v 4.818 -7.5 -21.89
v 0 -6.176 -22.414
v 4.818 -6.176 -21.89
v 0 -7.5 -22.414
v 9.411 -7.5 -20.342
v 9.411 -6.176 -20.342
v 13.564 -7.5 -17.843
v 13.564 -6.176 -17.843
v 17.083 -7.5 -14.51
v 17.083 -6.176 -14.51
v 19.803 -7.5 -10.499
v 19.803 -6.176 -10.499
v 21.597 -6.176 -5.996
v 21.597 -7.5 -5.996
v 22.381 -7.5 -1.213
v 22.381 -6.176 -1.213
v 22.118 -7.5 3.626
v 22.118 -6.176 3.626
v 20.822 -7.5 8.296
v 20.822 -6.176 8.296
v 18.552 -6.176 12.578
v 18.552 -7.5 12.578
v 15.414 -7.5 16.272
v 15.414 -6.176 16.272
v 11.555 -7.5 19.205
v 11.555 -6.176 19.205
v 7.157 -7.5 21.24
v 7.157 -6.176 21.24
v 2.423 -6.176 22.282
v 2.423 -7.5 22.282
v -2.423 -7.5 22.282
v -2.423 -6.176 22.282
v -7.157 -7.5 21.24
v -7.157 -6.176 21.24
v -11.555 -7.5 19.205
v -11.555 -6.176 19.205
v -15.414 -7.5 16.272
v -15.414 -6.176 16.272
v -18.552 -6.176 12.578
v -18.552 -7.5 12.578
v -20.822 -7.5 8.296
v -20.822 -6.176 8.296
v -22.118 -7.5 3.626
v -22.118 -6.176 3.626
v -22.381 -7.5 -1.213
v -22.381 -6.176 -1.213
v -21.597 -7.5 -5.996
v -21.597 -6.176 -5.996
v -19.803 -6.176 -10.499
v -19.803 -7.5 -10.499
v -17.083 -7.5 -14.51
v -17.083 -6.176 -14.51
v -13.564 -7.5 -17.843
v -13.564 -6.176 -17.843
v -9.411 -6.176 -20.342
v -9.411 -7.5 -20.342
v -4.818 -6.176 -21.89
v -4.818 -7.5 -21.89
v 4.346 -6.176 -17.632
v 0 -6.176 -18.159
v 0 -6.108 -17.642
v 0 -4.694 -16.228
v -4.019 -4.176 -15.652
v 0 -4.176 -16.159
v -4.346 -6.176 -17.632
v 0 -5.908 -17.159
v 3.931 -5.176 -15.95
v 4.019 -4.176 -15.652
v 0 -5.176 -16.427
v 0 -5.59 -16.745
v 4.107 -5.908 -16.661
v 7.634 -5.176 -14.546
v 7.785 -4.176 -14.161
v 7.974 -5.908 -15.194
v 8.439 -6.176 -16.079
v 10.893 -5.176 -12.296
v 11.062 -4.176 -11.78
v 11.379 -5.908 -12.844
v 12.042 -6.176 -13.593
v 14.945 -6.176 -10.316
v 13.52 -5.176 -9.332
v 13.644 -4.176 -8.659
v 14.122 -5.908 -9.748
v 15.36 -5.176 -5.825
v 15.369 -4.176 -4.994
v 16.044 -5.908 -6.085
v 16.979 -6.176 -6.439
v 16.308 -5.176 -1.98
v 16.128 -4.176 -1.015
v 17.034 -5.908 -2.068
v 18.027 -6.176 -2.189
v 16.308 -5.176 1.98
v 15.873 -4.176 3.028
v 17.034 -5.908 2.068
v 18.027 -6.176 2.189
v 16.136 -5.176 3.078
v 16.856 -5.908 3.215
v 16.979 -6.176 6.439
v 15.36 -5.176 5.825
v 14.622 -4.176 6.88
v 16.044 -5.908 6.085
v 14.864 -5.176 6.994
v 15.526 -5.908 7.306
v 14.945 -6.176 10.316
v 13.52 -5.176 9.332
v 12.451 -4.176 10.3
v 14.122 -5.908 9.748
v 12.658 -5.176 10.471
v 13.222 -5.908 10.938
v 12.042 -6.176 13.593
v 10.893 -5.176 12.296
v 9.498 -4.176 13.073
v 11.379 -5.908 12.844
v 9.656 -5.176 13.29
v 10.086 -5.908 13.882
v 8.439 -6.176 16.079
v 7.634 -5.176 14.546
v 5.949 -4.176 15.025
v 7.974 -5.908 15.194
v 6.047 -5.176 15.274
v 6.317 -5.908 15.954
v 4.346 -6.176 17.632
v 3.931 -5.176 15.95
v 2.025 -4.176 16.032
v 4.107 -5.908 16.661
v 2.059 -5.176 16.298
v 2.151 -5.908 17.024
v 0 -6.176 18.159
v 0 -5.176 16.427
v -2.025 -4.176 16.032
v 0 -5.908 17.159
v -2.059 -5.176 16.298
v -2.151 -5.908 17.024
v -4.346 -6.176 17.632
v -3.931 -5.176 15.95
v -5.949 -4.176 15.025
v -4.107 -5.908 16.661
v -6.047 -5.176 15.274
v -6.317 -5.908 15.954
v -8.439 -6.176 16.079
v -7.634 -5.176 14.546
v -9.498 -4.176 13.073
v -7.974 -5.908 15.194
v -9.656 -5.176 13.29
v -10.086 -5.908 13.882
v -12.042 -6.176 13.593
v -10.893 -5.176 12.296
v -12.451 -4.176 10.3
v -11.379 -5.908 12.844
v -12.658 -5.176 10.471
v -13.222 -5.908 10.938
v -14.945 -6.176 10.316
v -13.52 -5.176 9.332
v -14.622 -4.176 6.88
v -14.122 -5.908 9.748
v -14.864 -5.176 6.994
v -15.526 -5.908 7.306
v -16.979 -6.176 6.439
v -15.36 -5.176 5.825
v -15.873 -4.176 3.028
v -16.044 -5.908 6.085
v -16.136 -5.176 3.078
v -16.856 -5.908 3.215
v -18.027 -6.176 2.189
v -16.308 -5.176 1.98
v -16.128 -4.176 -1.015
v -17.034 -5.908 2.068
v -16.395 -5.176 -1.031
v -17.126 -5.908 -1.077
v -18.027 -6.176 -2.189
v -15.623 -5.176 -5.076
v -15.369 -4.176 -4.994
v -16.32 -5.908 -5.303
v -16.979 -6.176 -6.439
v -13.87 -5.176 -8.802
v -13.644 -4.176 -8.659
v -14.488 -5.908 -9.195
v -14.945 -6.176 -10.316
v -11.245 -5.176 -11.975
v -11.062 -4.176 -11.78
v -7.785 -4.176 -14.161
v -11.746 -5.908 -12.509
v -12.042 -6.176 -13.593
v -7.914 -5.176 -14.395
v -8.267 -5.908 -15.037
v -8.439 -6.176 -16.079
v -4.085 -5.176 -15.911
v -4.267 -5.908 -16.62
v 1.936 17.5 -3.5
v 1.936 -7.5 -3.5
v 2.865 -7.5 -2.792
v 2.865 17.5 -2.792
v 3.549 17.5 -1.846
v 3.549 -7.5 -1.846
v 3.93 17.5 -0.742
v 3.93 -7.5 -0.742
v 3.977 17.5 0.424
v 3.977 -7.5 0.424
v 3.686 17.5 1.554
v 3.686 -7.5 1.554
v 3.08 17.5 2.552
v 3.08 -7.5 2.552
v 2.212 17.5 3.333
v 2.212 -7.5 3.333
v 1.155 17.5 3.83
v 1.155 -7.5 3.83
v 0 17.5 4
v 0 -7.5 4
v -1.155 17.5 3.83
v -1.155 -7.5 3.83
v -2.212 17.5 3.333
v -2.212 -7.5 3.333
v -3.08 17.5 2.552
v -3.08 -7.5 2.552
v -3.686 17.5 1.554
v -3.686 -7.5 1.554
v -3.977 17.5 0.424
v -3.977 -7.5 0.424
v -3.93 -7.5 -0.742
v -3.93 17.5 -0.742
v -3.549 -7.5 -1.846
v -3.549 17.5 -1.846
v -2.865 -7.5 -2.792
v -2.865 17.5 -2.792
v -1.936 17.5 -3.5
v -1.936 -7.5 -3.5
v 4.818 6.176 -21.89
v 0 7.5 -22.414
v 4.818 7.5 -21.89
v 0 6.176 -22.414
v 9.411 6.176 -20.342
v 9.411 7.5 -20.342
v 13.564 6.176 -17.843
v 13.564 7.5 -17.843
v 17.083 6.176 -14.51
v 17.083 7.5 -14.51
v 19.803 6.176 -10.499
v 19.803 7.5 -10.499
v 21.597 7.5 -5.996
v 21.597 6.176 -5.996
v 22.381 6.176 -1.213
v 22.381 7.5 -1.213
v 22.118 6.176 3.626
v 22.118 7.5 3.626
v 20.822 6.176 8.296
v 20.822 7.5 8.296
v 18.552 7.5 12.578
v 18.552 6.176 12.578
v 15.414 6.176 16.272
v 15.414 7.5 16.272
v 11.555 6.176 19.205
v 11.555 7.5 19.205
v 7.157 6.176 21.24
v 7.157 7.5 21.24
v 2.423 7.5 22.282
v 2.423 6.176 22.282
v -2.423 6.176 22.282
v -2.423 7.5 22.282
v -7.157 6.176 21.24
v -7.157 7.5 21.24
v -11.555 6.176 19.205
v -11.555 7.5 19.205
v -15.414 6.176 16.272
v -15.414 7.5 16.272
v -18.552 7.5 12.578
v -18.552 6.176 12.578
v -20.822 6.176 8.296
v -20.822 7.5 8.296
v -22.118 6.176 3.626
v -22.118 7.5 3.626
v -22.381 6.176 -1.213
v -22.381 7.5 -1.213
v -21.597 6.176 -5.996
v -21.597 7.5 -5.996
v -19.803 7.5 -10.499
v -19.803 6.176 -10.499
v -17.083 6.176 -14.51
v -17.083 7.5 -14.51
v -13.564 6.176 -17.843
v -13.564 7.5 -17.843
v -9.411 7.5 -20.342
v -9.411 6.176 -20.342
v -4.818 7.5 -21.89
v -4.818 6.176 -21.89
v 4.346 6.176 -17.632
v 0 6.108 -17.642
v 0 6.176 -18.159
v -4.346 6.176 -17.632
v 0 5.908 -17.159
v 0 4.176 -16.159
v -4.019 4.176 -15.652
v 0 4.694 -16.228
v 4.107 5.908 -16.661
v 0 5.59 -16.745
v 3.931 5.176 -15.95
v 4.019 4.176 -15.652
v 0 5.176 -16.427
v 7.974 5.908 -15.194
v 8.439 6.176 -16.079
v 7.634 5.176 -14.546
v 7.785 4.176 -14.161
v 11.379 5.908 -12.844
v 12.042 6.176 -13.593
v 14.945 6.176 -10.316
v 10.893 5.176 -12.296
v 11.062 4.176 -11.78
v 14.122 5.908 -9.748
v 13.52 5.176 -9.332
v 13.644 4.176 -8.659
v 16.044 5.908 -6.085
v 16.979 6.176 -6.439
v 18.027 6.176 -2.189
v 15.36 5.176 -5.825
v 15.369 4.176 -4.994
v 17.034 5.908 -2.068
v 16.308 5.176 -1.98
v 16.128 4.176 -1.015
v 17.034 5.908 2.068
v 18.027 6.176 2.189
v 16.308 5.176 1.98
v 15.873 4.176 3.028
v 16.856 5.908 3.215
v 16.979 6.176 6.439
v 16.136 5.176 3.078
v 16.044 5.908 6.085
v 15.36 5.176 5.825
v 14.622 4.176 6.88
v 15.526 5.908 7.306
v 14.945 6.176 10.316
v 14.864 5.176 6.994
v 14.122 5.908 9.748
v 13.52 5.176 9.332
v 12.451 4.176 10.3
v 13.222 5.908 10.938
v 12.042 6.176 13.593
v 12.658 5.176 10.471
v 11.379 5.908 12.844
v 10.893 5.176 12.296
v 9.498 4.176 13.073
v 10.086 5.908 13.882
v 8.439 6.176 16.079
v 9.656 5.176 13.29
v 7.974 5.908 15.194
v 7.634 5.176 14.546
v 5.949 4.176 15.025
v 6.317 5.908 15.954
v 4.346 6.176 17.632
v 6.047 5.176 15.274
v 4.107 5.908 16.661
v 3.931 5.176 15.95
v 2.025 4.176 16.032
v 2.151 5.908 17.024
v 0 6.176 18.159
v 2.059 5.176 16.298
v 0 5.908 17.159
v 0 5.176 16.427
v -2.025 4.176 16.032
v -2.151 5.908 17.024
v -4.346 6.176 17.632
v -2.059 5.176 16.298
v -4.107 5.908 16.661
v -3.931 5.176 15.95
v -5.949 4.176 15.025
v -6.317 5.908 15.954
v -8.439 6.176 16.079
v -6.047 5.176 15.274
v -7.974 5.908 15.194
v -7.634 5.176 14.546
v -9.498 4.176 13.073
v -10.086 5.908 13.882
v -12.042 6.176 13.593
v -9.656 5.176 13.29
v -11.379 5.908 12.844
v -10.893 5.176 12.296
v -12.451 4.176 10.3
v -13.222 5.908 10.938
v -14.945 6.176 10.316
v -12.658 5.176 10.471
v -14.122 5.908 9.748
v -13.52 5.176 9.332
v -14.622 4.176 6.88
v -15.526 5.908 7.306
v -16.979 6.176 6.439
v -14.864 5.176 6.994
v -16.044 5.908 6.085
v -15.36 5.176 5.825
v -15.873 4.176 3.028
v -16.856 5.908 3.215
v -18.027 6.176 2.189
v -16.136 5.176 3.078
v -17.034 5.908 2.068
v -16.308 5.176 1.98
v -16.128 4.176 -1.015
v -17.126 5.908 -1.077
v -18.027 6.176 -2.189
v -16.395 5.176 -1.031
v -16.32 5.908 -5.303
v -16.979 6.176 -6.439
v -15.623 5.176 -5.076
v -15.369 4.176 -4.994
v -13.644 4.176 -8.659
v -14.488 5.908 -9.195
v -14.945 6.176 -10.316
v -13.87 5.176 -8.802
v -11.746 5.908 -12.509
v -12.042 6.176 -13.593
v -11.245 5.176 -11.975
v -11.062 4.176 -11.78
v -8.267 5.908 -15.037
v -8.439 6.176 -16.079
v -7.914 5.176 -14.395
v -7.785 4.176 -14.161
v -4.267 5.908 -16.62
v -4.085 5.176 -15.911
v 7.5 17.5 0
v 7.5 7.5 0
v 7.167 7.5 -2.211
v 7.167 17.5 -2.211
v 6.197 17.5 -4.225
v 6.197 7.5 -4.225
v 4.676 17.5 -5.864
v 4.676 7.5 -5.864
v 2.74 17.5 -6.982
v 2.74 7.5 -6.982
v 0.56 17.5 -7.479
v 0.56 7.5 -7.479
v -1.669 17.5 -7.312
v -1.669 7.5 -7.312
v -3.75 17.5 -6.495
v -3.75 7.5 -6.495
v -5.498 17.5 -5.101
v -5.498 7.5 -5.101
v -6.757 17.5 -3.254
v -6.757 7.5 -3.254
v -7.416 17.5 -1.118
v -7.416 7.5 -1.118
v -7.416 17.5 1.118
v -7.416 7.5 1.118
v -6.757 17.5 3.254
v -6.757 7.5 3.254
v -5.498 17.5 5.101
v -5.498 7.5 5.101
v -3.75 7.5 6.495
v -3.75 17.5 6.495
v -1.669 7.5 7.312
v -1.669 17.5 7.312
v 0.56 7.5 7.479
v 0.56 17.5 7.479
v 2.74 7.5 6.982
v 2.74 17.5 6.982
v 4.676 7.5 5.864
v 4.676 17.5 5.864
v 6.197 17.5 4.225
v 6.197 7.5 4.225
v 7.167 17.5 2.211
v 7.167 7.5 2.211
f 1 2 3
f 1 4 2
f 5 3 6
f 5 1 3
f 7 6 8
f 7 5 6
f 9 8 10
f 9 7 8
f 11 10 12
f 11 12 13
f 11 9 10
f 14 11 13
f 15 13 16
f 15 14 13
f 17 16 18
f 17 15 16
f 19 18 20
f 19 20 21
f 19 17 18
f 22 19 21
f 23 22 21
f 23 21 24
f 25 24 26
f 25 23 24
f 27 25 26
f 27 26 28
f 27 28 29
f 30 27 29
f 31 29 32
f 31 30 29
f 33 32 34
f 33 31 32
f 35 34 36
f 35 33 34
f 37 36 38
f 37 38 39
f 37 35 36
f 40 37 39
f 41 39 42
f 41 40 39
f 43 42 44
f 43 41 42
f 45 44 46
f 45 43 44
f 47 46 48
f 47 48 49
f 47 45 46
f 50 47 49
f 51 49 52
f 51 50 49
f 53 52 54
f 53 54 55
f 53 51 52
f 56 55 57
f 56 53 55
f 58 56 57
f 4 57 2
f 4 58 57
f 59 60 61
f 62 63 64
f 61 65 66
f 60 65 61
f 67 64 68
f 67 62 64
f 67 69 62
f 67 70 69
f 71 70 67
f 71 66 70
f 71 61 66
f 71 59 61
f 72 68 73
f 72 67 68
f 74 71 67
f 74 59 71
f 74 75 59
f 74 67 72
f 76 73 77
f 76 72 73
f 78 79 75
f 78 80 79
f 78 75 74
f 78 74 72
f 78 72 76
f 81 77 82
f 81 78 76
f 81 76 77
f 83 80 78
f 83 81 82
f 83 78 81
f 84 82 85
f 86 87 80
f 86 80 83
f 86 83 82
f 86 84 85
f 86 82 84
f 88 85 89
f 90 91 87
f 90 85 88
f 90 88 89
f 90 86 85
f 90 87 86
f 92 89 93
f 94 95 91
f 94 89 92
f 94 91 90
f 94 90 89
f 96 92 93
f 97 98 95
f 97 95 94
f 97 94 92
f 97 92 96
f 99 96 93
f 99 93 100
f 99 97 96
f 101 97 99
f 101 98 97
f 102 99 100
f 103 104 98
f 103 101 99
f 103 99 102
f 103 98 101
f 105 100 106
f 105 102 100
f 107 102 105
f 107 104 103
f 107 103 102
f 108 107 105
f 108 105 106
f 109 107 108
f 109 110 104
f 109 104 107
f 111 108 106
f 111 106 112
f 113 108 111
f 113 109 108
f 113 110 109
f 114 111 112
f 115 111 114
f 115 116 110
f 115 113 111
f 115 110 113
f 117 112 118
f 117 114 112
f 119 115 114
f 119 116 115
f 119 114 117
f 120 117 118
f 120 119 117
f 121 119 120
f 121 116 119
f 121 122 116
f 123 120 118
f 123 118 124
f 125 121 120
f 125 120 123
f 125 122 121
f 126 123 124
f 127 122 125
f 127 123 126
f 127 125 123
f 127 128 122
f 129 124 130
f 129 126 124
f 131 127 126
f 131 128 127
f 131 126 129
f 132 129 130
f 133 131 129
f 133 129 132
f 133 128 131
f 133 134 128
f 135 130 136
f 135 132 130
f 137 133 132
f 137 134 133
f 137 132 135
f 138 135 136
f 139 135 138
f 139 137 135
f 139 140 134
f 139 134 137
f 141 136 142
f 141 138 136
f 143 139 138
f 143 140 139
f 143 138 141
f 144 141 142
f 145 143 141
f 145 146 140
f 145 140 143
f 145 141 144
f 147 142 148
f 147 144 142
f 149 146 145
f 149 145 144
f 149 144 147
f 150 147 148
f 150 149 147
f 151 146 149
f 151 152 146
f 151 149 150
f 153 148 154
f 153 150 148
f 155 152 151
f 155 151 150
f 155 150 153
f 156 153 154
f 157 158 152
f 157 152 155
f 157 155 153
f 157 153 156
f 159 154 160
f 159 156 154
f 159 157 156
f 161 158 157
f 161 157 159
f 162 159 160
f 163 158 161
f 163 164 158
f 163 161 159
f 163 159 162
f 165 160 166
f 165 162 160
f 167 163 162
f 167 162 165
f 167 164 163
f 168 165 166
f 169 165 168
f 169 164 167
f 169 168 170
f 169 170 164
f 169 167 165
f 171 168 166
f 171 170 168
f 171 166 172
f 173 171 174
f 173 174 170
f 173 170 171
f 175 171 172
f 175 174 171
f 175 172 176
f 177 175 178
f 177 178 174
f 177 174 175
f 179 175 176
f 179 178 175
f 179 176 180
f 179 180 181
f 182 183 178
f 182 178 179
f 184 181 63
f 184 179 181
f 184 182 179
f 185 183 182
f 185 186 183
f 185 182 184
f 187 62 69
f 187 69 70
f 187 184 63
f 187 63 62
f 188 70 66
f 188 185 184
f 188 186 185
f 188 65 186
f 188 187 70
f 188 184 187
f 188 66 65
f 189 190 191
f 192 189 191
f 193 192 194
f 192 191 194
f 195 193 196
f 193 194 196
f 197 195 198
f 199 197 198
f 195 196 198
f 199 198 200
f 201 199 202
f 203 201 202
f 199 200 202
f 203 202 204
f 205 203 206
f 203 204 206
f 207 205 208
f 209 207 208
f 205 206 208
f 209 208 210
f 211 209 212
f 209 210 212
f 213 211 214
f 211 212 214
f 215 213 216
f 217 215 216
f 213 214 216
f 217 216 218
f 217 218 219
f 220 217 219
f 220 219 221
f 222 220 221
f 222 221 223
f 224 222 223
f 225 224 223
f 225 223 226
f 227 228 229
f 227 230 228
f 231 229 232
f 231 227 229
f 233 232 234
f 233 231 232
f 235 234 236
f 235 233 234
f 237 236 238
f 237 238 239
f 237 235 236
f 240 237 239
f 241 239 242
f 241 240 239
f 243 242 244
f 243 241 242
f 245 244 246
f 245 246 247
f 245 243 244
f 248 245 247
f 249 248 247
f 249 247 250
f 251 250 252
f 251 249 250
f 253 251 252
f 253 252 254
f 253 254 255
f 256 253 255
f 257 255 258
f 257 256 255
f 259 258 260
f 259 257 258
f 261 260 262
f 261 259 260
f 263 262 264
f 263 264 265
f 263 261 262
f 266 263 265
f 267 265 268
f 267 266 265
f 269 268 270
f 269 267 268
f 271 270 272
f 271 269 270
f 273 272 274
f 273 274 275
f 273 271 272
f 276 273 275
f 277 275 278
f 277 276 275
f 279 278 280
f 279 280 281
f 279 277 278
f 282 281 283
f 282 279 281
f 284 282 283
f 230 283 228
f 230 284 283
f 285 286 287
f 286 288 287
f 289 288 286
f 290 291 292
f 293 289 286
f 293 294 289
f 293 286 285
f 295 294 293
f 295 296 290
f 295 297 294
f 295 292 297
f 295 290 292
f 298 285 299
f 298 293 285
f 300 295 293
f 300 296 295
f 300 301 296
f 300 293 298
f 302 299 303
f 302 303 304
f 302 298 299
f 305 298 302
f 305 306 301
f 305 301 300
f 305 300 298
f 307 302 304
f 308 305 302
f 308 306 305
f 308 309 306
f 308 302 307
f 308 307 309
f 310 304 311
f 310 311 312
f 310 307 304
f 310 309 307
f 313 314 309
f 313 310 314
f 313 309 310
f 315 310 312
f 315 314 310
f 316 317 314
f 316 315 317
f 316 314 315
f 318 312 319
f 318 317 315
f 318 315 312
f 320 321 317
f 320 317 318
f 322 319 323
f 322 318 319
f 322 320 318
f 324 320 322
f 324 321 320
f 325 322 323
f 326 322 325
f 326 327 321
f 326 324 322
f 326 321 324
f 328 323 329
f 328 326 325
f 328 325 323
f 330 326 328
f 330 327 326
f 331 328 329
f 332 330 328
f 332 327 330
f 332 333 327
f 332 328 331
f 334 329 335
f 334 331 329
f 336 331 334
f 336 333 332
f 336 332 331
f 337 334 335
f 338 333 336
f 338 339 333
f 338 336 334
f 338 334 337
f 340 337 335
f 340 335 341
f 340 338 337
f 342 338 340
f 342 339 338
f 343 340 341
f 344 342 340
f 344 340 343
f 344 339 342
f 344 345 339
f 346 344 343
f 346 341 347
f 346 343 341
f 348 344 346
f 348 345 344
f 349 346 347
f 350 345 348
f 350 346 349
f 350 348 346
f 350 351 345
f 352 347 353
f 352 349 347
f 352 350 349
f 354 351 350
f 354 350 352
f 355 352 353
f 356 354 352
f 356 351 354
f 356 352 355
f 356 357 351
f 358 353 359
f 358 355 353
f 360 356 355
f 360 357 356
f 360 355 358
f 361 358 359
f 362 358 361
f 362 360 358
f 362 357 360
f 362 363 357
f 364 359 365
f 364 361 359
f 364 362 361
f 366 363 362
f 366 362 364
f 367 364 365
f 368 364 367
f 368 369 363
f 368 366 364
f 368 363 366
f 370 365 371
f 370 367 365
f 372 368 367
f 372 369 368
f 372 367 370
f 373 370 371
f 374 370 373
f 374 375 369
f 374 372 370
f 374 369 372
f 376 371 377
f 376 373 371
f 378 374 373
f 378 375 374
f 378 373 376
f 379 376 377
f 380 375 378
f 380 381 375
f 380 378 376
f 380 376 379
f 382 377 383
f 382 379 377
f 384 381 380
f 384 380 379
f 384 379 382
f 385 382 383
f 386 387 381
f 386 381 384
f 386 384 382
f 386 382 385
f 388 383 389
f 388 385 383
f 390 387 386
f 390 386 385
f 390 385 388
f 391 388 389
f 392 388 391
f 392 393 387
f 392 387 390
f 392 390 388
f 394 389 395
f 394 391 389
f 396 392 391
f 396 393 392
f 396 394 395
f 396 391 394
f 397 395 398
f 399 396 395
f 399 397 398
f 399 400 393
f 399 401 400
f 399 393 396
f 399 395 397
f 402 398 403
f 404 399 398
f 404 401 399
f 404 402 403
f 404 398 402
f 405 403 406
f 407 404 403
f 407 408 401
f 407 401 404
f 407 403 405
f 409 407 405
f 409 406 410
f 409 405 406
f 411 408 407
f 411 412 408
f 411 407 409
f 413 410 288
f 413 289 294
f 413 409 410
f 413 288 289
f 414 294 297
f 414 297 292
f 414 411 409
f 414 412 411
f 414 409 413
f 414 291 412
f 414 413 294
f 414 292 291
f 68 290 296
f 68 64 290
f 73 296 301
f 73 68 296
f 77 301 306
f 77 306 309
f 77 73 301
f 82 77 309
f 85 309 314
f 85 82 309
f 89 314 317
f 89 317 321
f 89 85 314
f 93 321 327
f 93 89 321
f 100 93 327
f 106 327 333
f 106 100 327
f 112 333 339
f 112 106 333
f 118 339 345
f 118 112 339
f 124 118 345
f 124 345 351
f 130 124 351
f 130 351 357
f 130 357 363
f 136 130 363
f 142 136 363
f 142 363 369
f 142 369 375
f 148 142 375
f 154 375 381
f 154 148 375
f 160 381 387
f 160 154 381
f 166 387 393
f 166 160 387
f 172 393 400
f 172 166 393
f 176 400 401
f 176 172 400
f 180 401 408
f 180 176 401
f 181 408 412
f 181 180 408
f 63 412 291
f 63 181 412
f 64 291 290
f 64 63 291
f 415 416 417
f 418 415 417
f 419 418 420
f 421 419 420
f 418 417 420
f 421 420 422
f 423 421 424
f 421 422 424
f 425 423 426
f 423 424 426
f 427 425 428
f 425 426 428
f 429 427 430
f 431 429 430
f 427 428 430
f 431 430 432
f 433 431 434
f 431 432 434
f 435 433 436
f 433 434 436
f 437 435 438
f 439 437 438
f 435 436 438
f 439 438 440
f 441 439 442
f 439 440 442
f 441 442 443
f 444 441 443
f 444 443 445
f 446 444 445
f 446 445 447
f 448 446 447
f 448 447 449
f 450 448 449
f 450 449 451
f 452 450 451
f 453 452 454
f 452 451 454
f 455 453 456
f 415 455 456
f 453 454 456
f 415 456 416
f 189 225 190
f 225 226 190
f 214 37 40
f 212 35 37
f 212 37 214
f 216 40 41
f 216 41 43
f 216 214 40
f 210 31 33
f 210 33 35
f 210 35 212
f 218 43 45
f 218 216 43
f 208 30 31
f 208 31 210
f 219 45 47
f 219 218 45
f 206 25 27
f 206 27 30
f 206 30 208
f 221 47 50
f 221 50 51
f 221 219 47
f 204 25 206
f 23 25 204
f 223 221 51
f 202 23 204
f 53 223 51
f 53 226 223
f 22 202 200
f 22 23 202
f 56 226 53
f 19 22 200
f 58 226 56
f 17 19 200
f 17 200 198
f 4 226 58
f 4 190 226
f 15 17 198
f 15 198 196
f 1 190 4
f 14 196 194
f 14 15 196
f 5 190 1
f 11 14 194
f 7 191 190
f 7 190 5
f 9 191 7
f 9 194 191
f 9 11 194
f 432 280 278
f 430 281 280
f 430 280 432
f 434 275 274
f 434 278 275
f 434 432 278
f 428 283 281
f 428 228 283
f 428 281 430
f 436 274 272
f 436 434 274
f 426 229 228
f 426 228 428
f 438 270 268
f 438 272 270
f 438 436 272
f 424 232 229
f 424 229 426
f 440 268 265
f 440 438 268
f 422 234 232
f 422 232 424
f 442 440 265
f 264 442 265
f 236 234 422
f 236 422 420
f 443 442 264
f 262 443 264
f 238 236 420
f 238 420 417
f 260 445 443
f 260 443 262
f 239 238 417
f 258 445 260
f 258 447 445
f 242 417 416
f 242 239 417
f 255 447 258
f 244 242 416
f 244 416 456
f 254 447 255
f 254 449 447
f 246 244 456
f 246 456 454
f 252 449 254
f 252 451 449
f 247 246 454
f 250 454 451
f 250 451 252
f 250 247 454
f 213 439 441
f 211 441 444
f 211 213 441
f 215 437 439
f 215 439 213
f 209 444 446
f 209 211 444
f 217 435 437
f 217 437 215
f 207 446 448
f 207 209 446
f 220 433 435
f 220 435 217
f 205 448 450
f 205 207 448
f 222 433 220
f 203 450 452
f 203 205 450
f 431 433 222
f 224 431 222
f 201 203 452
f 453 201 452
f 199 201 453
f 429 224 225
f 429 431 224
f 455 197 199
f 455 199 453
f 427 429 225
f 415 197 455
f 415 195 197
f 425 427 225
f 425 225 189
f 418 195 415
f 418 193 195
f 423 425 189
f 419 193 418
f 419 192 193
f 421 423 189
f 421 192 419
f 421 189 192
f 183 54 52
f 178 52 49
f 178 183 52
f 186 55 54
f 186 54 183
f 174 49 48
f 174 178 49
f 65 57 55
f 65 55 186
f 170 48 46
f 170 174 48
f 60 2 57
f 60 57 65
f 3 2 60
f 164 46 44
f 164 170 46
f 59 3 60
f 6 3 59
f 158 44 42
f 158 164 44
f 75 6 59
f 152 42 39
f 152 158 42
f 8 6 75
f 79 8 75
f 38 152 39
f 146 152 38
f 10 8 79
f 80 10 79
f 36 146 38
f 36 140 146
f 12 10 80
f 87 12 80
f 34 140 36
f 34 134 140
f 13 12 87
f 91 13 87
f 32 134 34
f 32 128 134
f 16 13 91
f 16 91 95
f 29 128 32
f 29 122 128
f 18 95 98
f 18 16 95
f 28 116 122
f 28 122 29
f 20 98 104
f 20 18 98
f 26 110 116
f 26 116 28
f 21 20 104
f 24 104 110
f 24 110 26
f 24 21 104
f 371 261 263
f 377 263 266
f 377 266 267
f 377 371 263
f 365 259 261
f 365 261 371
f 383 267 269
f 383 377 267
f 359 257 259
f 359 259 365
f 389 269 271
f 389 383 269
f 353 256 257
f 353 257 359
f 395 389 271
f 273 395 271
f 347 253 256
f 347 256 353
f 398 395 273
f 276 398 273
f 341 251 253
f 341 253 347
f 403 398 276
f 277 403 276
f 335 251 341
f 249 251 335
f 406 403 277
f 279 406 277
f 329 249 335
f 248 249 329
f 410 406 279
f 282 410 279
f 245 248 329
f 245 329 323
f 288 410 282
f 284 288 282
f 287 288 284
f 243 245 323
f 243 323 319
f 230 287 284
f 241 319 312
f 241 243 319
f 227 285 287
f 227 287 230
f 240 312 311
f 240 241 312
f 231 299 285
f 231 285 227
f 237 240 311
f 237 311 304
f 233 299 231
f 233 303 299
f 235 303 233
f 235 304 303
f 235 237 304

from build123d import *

# Parameters (mm, degrees)
SKETCH2_R           = 15
BOSS_EXTRUDE1_DEPTH = 7.5
SKETCH4_R           = 7.5
BOSS_EXTRUDE2_DEPTH = 10


with BuildPart() as part:
    # Sketch2 → Boss-Extrude1 (new body, symmetric)
    with BuildSketch(Plane(origin=(0, 0, 0), x_dir=(1, 0, 0), z_dir=(0, 1, 0))):
        Circle(SKETCH2_R)
        with BuildLine():
            ThreePointArc((1.936491673, 3.5), (0, -4), (-1.936491673, 3.5))
            Line((-1.936491673, 3.5), (1.936491673, 3.5))
        make_face(mode=Mode.SUBTRACT)
    extrude(amount=BOSS_EXTRUDE1_DEPTH, both=True)

    # Sketch3 → Revolve1 (revolve)
    with BuildSketch(Plane(origin=(0, 0, 0), x_dir=(0, 0, -1), z_dir=(1, 0, 0))):
        with BuildLine():
            ThreePointArc((18.159478483, 6.176007768), (16.745264921, 5.59022133), (16.159478483, 4.176007768))
            Line((16.159478483, 4.176007768), (16.159478483, -4.176007768))
            ThreePointArc((16.159478483, -4.176007768), (16.745264921, -5.59022133), (18.159478483, -6.176007768))
            Line((18.159478483, -6.176007768), (22.413723235, -6.176007768))
            Line((22.413723235, -6.176007768), (22.413723235, -7.5))
            Line((22.413723235, -7.5), (15, -7.5))
            Line((15, -7.5), (15, 7.5))
            Line((15, 7.5), (22.413723235, 7.5))
            Line((22.413723235, 7.5), (22.413723235, 6.176007768))
            Line((22.413723235, 6.176007768), (18.159478483, 6.176007768))
        make_face()
    revolve(axis=Axis((0, 7.5, 0), (0, -1, 0)))

    # Sketch4 → Boss-Extrude2 (add)
    with BuildSketch(Plane(origin=(0, 7.5, 0), x_dir=(1, 0, 0), z_dir=(0, 1, 0))):
        Circle(SKETCH4_R)
        with BuildLine():
            Line((-1.936491673, 3.5), (1.936491673, 3.5))
            ThreePointArc((1.936491673, 3.5), (0, -4), (-1.936491673, 3.5))
        make_face(mode=Mode.SUBTRACT)
    extrude(amount=BOSS_EXTRUDE2_DEPTH)


solid = part.part
